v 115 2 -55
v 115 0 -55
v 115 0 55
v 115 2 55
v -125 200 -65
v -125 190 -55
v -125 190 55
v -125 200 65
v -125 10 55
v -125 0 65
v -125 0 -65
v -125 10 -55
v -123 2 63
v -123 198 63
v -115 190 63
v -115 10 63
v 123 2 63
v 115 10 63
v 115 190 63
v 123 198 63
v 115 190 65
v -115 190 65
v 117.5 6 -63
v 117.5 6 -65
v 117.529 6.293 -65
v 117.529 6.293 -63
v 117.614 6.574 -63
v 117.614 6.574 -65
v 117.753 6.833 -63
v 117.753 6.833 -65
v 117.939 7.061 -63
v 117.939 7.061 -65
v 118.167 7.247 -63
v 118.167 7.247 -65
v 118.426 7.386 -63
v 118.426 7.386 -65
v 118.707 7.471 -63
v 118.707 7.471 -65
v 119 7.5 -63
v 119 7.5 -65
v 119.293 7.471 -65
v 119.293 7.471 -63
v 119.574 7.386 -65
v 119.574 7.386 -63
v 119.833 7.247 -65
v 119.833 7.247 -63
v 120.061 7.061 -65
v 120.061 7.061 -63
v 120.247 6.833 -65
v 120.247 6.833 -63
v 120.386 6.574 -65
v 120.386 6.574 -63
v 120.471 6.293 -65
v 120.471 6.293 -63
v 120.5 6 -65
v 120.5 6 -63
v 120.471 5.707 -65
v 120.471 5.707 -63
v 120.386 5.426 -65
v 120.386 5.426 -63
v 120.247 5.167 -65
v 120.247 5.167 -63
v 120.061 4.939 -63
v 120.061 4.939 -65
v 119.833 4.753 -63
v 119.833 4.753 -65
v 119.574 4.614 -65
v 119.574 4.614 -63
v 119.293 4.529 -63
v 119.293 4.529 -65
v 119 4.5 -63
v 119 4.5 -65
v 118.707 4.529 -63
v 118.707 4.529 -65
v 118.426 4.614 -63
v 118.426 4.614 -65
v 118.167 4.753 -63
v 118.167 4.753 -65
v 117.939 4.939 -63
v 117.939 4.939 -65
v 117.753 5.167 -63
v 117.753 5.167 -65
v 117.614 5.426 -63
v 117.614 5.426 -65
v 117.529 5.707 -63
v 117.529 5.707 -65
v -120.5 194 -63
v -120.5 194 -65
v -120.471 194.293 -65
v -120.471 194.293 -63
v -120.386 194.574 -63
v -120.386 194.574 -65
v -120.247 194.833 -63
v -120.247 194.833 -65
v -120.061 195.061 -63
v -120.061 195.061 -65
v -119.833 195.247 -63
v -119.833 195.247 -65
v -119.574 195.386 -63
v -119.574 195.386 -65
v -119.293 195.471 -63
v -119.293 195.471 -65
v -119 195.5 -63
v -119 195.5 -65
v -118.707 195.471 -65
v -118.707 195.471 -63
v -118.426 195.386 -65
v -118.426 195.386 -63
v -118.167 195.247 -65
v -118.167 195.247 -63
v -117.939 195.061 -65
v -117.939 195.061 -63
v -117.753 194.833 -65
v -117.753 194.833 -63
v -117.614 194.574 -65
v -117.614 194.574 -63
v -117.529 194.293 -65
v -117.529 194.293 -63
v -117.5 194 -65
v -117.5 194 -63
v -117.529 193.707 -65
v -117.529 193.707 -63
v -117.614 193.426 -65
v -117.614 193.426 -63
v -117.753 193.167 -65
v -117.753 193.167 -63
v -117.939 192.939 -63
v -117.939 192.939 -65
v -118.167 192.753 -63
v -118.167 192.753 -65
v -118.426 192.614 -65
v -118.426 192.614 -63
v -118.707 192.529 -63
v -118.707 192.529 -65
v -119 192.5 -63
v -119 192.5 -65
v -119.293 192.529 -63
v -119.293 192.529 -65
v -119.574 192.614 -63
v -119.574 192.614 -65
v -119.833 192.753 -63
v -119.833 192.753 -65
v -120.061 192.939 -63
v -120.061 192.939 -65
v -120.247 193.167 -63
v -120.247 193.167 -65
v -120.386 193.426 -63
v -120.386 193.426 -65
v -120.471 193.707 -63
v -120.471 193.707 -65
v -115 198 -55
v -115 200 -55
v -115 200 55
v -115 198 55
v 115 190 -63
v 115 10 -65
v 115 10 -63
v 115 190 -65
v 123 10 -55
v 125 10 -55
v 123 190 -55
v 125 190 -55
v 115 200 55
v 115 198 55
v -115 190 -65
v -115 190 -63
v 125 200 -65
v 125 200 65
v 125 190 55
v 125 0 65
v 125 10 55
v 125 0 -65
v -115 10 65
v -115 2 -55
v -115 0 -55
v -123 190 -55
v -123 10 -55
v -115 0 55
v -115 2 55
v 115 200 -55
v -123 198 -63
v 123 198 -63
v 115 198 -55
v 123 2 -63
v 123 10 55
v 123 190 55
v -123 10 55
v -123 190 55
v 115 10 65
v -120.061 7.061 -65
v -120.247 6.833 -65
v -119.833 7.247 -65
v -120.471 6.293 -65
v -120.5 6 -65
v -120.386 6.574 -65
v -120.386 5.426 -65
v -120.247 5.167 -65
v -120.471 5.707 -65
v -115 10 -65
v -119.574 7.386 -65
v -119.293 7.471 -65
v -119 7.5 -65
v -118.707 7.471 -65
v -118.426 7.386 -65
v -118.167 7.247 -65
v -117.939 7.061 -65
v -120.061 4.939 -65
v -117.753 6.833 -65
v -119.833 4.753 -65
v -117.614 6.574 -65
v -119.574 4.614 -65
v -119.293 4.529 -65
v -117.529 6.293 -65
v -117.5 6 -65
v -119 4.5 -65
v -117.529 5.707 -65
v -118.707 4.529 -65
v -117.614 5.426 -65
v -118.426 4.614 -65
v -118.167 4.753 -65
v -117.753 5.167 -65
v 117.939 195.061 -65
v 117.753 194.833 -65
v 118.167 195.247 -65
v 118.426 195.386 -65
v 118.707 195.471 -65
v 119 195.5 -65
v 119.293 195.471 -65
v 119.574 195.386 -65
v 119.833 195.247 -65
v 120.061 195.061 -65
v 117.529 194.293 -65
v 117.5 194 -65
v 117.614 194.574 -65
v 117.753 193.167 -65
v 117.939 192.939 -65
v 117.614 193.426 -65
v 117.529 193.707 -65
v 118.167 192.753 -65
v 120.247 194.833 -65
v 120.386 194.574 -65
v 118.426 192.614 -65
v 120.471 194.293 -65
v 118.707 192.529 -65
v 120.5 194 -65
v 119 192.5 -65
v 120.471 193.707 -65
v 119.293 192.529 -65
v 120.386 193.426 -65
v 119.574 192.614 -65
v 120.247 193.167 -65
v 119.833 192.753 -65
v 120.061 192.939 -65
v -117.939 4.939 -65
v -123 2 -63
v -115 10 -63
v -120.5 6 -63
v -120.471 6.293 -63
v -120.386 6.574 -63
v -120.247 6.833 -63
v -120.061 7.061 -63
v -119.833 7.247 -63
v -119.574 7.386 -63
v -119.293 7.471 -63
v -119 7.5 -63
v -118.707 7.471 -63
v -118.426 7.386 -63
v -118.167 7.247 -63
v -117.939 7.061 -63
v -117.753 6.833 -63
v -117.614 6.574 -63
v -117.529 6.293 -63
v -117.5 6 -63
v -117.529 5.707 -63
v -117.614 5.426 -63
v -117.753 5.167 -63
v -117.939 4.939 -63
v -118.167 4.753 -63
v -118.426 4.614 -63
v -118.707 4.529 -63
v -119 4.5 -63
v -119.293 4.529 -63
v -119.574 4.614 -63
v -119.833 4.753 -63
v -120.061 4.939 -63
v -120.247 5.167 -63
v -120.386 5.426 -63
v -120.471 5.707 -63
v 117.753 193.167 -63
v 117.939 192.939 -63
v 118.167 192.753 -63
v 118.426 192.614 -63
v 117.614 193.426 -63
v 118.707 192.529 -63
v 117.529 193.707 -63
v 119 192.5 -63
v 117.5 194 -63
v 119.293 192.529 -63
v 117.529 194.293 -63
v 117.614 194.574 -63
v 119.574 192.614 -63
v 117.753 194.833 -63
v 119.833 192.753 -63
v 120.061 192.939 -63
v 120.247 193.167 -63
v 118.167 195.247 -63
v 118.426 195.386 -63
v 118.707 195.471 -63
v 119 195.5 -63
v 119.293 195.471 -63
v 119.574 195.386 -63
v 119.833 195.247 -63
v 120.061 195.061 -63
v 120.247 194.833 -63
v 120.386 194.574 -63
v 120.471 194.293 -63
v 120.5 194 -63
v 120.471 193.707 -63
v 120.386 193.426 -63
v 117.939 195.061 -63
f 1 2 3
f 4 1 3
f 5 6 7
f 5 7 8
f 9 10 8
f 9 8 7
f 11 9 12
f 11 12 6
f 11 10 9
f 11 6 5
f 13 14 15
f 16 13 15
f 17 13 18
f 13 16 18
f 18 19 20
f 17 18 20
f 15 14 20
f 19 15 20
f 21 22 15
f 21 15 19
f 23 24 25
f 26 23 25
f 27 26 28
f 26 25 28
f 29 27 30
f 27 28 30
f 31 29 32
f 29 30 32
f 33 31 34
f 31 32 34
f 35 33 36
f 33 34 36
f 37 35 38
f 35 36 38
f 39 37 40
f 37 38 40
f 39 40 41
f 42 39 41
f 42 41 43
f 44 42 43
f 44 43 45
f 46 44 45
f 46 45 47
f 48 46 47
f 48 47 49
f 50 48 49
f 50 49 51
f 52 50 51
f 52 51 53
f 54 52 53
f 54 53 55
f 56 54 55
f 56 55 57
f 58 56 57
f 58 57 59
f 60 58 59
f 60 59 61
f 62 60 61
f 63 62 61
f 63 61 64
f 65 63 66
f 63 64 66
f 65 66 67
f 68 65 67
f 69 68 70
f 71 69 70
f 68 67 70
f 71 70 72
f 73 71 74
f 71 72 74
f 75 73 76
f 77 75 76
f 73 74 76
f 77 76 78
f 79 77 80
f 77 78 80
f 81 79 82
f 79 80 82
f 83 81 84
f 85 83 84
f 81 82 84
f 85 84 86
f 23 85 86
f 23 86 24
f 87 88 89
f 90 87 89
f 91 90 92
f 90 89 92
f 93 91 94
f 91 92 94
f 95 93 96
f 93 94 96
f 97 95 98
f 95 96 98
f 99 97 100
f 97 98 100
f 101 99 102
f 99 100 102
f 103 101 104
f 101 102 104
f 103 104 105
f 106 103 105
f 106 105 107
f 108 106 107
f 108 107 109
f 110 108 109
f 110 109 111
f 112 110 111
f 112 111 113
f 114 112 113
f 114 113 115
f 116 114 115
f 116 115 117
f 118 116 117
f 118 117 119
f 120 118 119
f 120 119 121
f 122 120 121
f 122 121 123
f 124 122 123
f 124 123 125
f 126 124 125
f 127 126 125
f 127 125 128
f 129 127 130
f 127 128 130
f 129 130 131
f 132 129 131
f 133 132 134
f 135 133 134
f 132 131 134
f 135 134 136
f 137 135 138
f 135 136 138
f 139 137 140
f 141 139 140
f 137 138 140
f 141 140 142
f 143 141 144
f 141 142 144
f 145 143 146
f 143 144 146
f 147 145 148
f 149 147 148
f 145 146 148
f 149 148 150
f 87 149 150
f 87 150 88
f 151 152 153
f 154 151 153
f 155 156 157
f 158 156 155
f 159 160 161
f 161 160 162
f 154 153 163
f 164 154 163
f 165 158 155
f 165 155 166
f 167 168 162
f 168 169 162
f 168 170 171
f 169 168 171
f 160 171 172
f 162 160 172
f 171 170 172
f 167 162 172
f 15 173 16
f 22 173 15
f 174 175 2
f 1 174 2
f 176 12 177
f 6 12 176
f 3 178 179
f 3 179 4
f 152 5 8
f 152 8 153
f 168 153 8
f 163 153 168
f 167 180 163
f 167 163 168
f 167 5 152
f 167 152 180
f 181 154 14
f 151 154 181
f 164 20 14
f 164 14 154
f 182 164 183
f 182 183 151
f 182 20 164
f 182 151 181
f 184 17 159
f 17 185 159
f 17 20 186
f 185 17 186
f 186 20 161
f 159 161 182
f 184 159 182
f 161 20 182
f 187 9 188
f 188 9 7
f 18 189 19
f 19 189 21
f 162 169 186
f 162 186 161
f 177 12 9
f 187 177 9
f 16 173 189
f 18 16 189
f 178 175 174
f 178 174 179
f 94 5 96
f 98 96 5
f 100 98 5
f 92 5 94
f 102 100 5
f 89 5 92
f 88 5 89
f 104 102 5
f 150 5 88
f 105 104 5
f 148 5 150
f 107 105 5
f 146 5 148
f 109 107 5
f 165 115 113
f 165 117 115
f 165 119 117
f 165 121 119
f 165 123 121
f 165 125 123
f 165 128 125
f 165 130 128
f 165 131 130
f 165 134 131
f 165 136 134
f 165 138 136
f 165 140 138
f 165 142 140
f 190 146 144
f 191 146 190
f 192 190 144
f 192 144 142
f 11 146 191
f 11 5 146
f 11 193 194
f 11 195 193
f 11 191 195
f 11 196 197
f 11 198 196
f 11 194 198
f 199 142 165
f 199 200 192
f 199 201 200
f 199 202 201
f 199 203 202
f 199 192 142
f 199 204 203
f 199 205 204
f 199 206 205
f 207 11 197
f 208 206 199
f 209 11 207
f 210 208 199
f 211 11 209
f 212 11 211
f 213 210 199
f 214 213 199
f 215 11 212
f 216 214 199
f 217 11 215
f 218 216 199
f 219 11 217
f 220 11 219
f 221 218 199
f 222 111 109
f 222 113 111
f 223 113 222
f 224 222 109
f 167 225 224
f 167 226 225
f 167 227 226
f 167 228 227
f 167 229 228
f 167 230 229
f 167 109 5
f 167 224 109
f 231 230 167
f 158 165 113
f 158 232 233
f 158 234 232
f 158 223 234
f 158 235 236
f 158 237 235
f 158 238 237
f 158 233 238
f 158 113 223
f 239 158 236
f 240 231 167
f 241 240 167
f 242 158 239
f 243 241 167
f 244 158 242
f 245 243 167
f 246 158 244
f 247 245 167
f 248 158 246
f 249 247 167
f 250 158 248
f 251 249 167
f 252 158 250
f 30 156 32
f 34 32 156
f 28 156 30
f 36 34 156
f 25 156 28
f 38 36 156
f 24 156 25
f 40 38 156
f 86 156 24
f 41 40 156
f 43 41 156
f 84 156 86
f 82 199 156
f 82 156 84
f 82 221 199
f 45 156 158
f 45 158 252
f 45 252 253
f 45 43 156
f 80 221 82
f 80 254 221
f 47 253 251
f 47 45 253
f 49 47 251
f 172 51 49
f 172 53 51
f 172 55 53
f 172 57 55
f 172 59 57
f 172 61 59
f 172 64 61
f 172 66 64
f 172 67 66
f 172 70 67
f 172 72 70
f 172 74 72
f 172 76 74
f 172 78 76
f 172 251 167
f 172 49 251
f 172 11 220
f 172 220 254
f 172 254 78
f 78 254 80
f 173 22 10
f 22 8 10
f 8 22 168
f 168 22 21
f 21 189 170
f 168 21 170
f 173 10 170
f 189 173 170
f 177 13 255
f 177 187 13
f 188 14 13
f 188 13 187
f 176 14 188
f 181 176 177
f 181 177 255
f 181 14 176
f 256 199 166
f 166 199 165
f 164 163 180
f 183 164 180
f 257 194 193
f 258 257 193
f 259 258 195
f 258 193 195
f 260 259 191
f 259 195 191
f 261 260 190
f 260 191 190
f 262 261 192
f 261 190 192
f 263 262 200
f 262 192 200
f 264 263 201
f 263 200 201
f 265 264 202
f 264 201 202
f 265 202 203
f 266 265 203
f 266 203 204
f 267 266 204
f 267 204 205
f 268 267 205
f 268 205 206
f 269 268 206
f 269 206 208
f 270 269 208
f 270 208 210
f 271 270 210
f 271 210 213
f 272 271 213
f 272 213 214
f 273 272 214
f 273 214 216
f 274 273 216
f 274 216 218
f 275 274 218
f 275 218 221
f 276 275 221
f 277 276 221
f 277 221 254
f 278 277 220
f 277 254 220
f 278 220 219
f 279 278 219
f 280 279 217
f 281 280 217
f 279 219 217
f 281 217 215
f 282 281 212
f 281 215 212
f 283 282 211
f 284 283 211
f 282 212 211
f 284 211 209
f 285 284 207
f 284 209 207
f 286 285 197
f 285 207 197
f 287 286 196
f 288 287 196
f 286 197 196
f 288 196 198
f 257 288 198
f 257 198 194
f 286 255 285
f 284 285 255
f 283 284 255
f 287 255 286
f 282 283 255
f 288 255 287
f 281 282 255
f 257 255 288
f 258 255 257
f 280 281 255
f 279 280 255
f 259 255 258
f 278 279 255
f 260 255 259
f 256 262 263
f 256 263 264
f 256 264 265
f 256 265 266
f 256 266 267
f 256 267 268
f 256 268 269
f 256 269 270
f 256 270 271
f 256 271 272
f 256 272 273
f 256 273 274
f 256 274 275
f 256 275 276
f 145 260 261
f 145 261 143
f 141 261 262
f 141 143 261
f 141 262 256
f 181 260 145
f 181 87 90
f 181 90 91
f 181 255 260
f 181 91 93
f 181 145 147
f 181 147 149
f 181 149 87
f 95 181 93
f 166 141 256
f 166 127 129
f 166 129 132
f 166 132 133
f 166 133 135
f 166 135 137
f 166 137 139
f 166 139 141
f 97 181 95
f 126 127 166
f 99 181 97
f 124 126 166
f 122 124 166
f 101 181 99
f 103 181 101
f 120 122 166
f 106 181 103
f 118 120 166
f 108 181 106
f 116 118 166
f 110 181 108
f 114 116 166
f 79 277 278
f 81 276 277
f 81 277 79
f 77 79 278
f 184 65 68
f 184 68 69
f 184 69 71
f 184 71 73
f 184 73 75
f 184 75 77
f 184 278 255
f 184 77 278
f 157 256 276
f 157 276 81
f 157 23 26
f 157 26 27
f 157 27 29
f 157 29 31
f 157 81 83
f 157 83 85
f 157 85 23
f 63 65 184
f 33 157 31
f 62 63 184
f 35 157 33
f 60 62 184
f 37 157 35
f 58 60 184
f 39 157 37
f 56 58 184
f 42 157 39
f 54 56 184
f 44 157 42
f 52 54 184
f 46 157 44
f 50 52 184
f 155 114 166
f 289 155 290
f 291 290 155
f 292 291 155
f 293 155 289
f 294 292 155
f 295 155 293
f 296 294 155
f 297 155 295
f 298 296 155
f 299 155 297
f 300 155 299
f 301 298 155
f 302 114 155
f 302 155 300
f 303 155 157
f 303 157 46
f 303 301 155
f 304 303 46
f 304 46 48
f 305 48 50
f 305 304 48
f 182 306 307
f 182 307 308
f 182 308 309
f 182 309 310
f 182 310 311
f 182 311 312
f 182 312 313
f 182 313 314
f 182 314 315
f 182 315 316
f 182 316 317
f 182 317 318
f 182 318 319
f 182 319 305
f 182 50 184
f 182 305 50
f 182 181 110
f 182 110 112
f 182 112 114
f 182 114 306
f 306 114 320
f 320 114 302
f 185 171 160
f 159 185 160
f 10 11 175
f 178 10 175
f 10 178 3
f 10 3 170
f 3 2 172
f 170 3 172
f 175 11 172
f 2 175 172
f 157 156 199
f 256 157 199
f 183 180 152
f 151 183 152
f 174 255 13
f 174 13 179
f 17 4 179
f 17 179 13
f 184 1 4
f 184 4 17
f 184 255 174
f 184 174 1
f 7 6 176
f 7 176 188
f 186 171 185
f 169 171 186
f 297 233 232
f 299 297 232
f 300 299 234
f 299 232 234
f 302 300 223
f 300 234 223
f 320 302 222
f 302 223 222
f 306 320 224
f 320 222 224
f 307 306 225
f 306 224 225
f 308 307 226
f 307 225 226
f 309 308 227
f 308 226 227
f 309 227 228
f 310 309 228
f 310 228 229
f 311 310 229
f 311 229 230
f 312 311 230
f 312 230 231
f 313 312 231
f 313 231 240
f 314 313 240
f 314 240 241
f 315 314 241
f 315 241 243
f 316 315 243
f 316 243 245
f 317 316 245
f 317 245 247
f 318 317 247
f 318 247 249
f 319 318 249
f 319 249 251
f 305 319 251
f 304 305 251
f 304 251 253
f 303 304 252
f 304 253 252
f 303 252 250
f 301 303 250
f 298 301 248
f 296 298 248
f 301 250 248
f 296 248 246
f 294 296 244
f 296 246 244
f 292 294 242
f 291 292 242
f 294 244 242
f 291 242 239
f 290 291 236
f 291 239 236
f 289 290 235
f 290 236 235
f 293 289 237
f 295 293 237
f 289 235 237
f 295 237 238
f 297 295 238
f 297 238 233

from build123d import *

# Parameters (mm, degrees)
SKETCH1_W           = 250
SKETCH1_H           = 130
BOSS_EXTRUDE1_DEPTH = 200
SKETCH2_W           = 246
SKETCH2_H           = 126
CUT_EXTRUDE1_DEPTH  = 198
SKETCH3_W           = 230
SKETCH3_H           = 180
CUT_EXTRUDE2_DEPTH  = 3
SKETCH4_W           = 250
SKETCH4_H           = 2
BOSS_EXTRUDE2_DEPTH = 10
SKETCH5_W           = 110
SKETCH5_H           = 180
CUT_EXTRUDE3_DEPTH  = 3
SKETCH6_W           = 130
SKETCH6_H           = 2
BOSS_EXTRUDE3_DEPTH = 10
SKETCH7_W           = 230
SKETCH7_H           = 180
CUT_EXTRUDE4_DEPTH  = 3
SKETCH8_W           = 250
SKETCH8_H           = 2
BOSS_EXTRUDE4_DEPTH = 10
SKETCH9_W           = 110
SKETCH9_H           = 180
CUT_EXTRUDE5_DEPTH  = 3
SKETCH10_W          = 130
SKETCH10_H          = 2
BOSS_EXTRUDE5_DEPTH = 10
SKETCH11_W          = 230
SKETCH11_H          = 110
CUT_EXTRUDE7_DEPTH  = 3
SKETCH12_R          = 1.5
CUT_EXTRUDE8_DEPTH  = 3


with BuildPart() as part:
    # Sketch1 → Boss-Extrude1 (new body)
    with BuildSketch(Plane(origin=(0, 0, 0), x_dir=(1, 0, 0), z_dir=(0, 1, 0))):
        Rectangle(SKETCH1_W, SKETCH1_H)
    extrude(amount=BOSS_EXTRUDE1_DEPTH)

    # Sketch2 → Cut-Extrude1 (cut)
    with BuildSketch(Plane(origin=(0, 200, 0), x_dir=(1, 0, 0), z_dir=(0, 1, 0))):
        Rectangle(SKETCH2_W, SKETCH2_H)
    extrude(amount=-CUT_EXTRUDE1_DEPTH, mode=Mode.SUBTRACT)

    # Sketch3 → Cut-Extrude2 (cut)
    with BuildSketch(Plane.XY.offset(65)):
        with Locations((0, 100)):
            Rectangle(SKETCH3_W, SKETCH3_H)
    extrude(amount=-CUT_EXTRUDE2_DEPTH, mode=Mode.SUBTRACT)

    # Sketch4 → Boss-Extrude2 (add)
    with BuildSketch(Plane.XY.offset(65)):
        with Locations((0, 199)):
            Rectangle(SKETCH4_W, SKETCH4_H)
    extrude(amount=-BOSS_EXTRUDE2_DEPTH)

    # Sketch5 → Cut-Extrude3 (cut)
    with BuildSketch(Plane(origin=(125, 0, 0), x_dir=(0, 0, -1), z_dir=(1, 0, 0))):
        with Locations((0, 100)):
            Rectangle(SKETCH5_W, SKETCH5_H)
    extrude(amount=-CUT_EXTRUDE3_DEPTH, mode=Mode.SUBTRACT)

    # Sketch6 → Boss-Extrude3 (add)
    with BuildSketch(Plane(origin=(125, 0, 0), x_dir=(0, 0, -1), z_dir=(1, 0, 0))):
        with Locations((0, 199)):
            Rectangle(SKETCH6_W, SKETCH6_H)
    extrude(amount=-BOSS_EXTRUDE3_DEPTH)

    # Sketch7 → Cut-Extrude4 (cut)
    with BuildSketch(Plane(origin=(0, 0, -65), x_dir=(-1, 0, 0), z_dir=(0, 0, -1))):
        with Locations((0, 100)):
            Rectangle(SKETCH7_W, SKETCH7_H)
    extrude(amount=-CUT_EXTRUDE4_DEPTH, mode=Mode.SUBTRACT)

    # Sketch8 → Boss-Extrude4 (add)
    with BuildSketch(Plane(origin=(0, 0, -65), x_dir=(-1, 0, 0), z_dir=(0, 0, -1))):
        with Locations((0, 199)):
            Rectangle(SKETCH8_W, SKETCH8_H)
    extrude(amount=-BOSS_EXTRUDE4_DEPTH)

    # Sketch9 → Cut-Extrude5 (cut)
    with BuildSketch(Plane.ZY.offset(125)):
        with Locations((0, 100)):
            Rectangle(SKETCH9_W, SKETCH9_H)
    extrude(amount=-CUT_EXTRUDE5_DEPTH, mode=Mode.SUBTRACT)

    # Sketch10 → Boss-Extrude5 (add)
    with BuildSketch(Plane.ZY.offset(125)):
        with Locations((0, 199)):
            Rectangle(SKETCH10_W, SKETCH10_H)
    extrude(amount=-BOSS_EXTRUDE5_DEPTH)

    # Sketch11 → Cut-Extrude7 (cut)
    with BuildSketch(Plane.XZ):
        Rectangle(SKETCH11_W, SKETCH11_H)
    extrude(amount=-CUT_EXTRUDE7_DEPTH, mode=Mode.SUBTRACT)

    # Sketch12 → Cut-Extrude8 (cut)
    with BuildSketch(Plane(origin=(0, 0, -65), x_dir=(-1, 0, 0), z_dir=(0, 0, -1))):
        with Locations((-119, 194)):
            Circle(SKETCH12_R)
        with Locations((119, 194)):
            Circle(SKETCH12_R)
        with Locations((119, 6)):
            Circle(SKETCH12_R)
        with Locations((-119, 6)):
            Circle(SKETCH12_R)
    extrude(amount=-CUT_EXTRUDE8_DEPTH, mode=Mode.SUBTRACT)


solid = part.part
